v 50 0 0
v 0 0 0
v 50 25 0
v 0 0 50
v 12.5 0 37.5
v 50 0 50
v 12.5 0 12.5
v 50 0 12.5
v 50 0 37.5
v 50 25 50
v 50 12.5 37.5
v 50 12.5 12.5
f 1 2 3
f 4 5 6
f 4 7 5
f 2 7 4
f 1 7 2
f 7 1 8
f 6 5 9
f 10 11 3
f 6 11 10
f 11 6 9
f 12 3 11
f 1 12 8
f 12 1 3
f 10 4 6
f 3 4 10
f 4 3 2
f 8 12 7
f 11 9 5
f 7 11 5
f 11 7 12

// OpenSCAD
// Tuerkeil 5x2
$x=25;
$y=50;
$z=$y;

$x2=$x/2;
$y2=$y/2;
$z2=$z/2;

difference()
{
linear_extrude(height = $z)
polygon([[0,0],[$y,0],[$y,$x]]);

color("red")
translate([$y2/2,0,$z2/2])
linear_extrude(height = $z2)
polygon([[0,0],[$y2*1.5,0],[$y2*1.5,$x2]]);
}
